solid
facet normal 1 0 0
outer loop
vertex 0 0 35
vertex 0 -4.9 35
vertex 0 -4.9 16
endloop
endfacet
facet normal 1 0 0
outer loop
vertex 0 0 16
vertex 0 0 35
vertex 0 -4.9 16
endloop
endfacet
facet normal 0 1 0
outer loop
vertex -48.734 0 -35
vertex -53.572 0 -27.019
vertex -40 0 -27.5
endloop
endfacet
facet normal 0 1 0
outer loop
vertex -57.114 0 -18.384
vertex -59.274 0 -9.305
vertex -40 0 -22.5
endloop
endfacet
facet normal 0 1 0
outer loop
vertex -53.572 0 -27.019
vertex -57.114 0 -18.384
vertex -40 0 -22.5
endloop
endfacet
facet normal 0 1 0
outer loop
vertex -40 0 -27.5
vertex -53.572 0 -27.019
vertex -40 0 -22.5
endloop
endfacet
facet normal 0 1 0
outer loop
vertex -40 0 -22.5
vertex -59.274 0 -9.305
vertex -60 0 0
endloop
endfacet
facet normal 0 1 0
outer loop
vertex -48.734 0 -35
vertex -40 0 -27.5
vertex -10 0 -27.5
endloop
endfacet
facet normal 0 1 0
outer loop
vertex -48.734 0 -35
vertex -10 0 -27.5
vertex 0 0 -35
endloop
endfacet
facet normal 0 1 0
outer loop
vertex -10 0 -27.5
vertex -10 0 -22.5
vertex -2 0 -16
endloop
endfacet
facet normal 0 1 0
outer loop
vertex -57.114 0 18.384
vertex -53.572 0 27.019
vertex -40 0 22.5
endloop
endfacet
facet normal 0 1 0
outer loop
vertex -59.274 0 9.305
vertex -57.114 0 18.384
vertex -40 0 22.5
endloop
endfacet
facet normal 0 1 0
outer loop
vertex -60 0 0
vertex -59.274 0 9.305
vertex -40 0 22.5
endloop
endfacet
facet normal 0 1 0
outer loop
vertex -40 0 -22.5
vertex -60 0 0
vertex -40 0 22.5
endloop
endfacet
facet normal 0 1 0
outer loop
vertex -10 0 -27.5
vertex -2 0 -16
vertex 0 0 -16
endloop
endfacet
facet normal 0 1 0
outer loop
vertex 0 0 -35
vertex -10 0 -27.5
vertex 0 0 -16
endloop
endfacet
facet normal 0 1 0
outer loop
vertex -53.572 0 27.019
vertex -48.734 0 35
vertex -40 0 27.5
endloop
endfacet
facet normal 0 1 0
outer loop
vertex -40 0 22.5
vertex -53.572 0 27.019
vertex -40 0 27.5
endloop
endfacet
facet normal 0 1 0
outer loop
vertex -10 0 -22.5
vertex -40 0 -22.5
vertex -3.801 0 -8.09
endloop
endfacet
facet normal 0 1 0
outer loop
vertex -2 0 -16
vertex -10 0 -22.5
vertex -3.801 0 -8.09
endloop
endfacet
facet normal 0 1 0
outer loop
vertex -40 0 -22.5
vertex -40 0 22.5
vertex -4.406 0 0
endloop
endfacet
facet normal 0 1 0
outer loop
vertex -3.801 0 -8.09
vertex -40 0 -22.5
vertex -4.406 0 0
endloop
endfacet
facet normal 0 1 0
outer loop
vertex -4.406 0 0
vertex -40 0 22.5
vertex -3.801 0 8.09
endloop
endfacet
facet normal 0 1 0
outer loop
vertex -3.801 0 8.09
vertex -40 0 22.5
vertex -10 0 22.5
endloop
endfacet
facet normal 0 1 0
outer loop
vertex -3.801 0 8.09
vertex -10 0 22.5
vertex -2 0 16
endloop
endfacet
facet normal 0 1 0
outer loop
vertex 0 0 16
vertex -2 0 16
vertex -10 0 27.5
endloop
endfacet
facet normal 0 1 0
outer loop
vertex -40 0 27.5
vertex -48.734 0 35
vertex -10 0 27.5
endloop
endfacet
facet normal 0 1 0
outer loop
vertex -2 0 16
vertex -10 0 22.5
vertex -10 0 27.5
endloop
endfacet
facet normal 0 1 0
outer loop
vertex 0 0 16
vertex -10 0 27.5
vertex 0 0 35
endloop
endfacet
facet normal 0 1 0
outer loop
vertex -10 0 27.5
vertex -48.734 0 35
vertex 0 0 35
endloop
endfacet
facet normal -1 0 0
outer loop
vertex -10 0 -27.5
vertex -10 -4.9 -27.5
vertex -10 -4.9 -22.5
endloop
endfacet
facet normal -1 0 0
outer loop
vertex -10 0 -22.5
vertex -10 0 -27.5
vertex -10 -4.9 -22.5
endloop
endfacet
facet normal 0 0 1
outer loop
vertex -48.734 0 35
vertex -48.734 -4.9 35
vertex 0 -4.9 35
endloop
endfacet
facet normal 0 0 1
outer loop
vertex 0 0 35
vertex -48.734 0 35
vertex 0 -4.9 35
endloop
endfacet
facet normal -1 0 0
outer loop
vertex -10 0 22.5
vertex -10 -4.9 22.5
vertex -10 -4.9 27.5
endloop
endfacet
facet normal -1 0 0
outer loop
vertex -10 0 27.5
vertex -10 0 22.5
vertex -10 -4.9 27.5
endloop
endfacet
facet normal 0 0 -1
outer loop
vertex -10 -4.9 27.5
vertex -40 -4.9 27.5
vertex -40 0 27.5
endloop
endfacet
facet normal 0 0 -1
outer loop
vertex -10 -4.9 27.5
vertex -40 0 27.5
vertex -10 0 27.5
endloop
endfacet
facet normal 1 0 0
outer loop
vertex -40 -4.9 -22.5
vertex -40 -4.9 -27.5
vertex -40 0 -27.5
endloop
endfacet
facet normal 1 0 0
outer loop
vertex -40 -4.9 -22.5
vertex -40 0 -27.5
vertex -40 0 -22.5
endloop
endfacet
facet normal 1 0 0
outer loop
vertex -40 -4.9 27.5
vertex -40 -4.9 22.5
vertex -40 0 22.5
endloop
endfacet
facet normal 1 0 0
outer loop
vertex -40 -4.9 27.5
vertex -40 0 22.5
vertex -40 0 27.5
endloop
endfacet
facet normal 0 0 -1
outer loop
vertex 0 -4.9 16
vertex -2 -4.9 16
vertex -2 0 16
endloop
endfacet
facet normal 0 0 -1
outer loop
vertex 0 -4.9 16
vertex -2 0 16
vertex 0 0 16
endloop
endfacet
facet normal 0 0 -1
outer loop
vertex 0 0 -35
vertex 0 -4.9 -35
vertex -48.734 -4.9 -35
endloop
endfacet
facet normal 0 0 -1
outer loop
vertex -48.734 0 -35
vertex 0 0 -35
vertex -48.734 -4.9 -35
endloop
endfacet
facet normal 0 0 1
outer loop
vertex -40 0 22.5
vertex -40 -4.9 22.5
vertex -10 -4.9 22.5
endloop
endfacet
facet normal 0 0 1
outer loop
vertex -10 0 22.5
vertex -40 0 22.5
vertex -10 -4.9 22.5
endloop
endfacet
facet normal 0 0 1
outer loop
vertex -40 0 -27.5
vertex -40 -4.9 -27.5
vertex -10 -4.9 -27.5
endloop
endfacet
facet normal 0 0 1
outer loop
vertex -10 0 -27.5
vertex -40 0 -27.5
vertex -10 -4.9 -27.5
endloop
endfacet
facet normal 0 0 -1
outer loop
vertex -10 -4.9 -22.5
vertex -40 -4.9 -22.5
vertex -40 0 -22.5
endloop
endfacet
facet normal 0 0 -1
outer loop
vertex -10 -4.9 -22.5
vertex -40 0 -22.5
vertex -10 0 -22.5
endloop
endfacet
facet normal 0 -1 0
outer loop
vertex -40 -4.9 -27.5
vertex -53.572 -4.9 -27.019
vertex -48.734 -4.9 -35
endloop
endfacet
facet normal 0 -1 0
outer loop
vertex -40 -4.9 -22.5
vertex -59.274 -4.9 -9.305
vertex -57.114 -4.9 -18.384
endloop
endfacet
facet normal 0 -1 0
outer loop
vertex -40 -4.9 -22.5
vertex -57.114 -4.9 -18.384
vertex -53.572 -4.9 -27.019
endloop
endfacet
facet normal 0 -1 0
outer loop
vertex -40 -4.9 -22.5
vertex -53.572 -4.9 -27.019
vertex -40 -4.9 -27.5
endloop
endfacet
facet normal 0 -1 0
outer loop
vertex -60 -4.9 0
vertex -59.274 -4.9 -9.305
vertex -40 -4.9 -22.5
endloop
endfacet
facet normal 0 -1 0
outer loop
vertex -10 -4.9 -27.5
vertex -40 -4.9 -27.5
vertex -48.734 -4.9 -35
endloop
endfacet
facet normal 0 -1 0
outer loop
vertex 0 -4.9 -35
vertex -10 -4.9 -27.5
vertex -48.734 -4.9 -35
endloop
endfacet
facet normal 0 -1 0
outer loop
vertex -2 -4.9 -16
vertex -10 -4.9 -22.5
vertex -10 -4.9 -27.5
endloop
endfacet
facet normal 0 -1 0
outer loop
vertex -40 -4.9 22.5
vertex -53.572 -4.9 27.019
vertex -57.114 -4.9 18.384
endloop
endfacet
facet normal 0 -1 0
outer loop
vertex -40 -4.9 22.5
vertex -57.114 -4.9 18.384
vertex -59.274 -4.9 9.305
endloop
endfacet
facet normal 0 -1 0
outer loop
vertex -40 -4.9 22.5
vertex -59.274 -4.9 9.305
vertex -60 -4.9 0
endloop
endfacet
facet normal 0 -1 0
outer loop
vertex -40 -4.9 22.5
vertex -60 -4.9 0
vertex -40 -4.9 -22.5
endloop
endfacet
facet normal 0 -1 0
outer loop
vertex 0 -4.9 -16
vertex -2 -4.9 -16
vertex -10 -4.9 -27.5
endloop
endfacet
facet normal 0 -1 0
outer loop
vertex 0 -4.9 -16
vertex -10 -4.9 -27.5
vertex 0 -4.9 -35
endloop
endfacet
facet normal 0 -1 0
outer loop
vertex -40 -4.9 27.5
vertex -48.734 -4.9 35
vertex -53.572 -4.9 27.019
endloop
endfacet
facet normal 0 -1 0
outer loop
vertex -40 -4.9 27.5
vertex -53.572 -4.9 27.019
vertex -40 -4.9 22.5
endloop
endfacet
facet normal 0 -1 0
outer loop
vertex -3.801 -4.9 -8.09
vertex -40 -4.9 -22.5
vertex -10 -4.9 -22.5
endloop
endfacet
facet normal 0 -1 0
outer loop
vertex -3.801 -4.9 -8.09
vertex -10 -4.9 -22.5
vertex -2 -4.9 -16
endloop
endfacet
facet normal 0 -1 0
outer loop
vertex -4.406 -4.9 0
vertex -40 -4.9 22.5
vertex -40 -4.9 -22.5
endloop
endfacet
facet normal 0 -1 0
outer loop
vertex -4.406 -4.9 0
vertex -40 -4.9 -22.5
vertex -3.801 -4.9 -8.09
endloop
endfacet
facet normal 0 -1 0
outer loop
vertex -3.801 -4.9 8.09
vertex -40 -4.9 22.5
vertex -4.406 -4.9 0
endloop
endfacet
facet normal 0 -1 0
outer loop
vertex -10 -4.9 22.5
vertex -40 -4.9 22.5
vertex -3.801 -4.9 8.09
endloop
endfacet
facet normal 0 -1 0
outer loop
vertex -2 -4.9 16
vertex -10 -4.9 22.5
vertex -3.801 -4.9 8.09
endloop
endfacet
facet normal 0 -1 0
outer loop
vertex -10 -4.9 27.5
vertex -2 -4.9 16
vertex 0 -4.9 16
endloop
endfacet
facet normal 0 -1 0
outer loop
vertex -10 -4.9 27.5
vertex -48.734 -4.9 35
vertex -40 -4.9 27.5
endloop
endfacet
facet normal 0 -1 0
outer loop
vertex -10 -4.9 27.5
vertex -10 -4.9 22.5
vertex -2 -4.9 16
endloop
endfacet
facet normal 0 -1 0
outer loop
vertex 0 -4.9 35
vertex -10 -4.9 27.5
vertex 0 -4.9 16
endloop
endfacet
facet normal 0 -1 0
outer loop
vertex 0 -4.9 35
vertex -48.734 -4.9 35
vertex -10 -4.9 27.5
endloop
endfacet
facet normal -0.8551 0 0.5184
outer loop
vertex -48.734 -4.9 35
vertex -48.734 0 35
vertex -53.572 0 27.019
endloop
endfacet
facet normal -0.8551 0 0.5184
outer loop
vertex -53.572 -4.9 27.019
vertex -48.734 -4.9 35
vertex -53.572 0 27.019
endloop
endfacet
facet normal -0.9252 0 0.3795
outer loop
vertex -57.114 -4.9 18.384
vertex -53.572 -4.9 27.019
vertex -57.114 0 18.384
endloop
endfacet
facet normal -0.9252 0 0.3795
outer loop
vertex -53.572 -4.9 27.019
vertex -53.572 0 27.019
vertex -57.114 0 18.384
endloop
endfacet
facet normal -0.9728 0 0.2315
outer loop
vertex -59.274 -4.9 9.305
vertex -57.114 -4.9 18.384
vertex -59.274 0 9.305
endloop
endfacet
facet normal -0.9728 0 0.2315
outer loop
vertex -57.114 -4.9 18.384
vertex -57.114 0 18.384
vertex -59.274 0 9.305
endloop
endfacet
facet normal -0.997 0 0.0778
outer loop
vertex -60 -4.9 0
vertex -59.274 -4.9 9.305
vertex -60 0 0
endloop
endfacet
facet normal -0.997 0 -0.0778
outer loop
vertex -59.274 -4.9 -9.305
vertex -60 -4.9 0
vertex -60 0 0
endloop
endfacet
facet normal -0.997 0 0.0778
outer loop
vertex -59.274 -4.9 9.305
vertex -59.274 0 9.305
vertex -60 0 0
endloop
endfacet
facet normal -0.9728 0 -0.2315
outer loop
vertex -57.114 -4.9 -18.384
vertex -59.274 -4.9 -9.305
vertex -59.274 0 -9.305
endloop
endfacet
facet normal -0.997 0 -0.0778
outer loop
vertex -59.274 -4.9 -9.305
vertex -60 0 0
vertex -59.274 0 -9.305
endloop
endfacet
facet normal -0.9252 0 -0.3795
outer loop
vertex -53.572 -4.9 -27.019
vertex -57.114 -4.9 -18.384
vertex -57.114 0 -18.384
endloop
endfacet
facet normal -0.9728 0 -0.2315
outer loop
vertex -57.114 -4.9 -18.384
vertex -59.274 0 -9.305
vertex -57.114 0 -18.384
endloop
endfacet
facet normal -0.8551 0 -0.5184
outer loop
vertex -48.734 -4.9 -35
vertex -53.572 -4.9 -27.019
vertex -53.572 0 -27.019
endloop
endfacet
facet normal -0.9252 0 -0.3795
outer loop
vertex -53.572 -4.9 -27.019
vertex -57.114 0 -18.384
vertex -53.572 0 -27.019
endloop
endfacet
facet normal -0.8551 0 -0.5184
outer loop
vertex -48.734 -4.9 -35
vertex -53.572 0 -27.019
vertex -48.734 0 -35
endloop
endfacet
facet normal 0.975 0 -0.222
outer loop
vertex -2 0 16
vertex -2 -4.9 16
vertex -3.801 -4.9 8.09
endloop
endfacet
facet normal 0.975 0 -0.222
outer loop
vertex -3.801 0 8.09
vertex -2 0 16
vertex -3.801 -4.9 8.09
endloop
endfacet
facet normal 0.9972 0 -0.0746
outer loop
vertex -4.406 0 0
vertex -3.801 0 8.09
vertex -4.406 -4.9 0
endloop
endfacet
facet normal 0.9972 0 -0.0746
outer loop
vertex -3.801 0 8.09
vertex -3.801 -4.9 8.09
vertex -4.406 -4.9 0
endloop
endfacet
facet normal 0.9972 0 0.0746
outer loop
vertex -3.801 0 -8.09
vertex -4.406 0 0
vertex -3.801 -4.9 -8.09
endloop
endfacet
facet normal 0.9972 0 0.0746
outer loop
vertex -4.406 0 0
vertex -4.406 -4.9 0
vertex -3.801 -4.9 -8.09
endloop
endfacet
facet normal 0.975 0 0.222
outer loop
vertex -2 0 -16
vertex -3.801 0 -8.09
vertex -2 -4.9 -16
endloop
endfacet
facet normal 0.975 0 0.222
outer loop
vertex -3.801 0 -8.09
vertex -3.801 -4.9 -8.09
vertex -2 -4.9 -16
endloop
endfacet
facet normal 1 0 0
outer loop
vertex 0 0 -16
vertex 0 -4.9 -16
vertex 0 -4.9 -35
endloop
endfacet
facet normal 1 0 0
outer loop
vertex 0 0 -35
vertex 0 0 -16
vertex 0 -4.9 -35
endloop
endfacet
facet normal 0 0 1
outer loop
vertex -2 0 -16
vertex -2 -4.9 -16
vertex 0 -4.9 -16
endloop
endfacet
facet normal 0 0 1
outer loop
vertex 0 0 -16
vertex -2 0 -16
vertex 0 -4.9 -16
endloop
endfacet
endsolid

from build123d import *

# Parameters (mm, degrees)
F0_R     = 60
F1_DEPTH = 4.9
F3_DEPTH = 4.901
F4_W     = 2
F4_H     = 32
F5_DEPTH = 4.901
F6_W     = 30
F6_H     = 5
F7_DEPTH = 4.901


with BuildPart() as f1:
    # F0 (on Front) → F1 (new body)
    with BuildSketch(Plane.XZ):
        Circle(F0_R)
    extrude(amount=F1_DEPTH)

    # F2 (on face) → F3 (cut, through all)
    with BuildSketch(Plane.XZ.offset(4.9)):
        with BuildLine():
            ThreePointArc((60, 0), (18.3842554453, 57.1140889074), (-48.733971724, 35))
            Line((-48.733971724, 35), (0, 35))
            Line((0, 35), (0, -35))
            Line((0, -35), (-48.733971724, -35))
            ThreePointArc((-48.733971724, -35), (18.3842554453, -57.1140889074), (60, 0))
        make_face()
    extrude(amount=-F3_DEPTH, mode=Mode.SUBTRACT)

    # F4 (on face) → F5 (cut, through all)
    with BuildSketch(Plane.XZ.offset(4.9)):
        with BuildLine():
            Line((-2, -16), (-2, 16))
            ThreePointArc((-2, 16), (-4.4058820349, 0), (-2, -16))
        make_face()
        with Locations((-1, 0)):
            Rectangle(F4_W, F4_H)
    extrude(amount=-F5_DEPTH, mode=Mode.SUBTRACT)

    # F6 (on face) → F7 (cut, through all)
    with BuildSketch(Plane.XZ.offset(4.9)):
        with Locations((-25, 25)):
            Rectangle(F6_W, F6_H)
        with Locations((-25, -25)):
            Rectangle(F6_W, F6_H)
    extrude(amount=-F7_DEPTH, mode=Mode.SUBTRACT)


solid = f1.part
